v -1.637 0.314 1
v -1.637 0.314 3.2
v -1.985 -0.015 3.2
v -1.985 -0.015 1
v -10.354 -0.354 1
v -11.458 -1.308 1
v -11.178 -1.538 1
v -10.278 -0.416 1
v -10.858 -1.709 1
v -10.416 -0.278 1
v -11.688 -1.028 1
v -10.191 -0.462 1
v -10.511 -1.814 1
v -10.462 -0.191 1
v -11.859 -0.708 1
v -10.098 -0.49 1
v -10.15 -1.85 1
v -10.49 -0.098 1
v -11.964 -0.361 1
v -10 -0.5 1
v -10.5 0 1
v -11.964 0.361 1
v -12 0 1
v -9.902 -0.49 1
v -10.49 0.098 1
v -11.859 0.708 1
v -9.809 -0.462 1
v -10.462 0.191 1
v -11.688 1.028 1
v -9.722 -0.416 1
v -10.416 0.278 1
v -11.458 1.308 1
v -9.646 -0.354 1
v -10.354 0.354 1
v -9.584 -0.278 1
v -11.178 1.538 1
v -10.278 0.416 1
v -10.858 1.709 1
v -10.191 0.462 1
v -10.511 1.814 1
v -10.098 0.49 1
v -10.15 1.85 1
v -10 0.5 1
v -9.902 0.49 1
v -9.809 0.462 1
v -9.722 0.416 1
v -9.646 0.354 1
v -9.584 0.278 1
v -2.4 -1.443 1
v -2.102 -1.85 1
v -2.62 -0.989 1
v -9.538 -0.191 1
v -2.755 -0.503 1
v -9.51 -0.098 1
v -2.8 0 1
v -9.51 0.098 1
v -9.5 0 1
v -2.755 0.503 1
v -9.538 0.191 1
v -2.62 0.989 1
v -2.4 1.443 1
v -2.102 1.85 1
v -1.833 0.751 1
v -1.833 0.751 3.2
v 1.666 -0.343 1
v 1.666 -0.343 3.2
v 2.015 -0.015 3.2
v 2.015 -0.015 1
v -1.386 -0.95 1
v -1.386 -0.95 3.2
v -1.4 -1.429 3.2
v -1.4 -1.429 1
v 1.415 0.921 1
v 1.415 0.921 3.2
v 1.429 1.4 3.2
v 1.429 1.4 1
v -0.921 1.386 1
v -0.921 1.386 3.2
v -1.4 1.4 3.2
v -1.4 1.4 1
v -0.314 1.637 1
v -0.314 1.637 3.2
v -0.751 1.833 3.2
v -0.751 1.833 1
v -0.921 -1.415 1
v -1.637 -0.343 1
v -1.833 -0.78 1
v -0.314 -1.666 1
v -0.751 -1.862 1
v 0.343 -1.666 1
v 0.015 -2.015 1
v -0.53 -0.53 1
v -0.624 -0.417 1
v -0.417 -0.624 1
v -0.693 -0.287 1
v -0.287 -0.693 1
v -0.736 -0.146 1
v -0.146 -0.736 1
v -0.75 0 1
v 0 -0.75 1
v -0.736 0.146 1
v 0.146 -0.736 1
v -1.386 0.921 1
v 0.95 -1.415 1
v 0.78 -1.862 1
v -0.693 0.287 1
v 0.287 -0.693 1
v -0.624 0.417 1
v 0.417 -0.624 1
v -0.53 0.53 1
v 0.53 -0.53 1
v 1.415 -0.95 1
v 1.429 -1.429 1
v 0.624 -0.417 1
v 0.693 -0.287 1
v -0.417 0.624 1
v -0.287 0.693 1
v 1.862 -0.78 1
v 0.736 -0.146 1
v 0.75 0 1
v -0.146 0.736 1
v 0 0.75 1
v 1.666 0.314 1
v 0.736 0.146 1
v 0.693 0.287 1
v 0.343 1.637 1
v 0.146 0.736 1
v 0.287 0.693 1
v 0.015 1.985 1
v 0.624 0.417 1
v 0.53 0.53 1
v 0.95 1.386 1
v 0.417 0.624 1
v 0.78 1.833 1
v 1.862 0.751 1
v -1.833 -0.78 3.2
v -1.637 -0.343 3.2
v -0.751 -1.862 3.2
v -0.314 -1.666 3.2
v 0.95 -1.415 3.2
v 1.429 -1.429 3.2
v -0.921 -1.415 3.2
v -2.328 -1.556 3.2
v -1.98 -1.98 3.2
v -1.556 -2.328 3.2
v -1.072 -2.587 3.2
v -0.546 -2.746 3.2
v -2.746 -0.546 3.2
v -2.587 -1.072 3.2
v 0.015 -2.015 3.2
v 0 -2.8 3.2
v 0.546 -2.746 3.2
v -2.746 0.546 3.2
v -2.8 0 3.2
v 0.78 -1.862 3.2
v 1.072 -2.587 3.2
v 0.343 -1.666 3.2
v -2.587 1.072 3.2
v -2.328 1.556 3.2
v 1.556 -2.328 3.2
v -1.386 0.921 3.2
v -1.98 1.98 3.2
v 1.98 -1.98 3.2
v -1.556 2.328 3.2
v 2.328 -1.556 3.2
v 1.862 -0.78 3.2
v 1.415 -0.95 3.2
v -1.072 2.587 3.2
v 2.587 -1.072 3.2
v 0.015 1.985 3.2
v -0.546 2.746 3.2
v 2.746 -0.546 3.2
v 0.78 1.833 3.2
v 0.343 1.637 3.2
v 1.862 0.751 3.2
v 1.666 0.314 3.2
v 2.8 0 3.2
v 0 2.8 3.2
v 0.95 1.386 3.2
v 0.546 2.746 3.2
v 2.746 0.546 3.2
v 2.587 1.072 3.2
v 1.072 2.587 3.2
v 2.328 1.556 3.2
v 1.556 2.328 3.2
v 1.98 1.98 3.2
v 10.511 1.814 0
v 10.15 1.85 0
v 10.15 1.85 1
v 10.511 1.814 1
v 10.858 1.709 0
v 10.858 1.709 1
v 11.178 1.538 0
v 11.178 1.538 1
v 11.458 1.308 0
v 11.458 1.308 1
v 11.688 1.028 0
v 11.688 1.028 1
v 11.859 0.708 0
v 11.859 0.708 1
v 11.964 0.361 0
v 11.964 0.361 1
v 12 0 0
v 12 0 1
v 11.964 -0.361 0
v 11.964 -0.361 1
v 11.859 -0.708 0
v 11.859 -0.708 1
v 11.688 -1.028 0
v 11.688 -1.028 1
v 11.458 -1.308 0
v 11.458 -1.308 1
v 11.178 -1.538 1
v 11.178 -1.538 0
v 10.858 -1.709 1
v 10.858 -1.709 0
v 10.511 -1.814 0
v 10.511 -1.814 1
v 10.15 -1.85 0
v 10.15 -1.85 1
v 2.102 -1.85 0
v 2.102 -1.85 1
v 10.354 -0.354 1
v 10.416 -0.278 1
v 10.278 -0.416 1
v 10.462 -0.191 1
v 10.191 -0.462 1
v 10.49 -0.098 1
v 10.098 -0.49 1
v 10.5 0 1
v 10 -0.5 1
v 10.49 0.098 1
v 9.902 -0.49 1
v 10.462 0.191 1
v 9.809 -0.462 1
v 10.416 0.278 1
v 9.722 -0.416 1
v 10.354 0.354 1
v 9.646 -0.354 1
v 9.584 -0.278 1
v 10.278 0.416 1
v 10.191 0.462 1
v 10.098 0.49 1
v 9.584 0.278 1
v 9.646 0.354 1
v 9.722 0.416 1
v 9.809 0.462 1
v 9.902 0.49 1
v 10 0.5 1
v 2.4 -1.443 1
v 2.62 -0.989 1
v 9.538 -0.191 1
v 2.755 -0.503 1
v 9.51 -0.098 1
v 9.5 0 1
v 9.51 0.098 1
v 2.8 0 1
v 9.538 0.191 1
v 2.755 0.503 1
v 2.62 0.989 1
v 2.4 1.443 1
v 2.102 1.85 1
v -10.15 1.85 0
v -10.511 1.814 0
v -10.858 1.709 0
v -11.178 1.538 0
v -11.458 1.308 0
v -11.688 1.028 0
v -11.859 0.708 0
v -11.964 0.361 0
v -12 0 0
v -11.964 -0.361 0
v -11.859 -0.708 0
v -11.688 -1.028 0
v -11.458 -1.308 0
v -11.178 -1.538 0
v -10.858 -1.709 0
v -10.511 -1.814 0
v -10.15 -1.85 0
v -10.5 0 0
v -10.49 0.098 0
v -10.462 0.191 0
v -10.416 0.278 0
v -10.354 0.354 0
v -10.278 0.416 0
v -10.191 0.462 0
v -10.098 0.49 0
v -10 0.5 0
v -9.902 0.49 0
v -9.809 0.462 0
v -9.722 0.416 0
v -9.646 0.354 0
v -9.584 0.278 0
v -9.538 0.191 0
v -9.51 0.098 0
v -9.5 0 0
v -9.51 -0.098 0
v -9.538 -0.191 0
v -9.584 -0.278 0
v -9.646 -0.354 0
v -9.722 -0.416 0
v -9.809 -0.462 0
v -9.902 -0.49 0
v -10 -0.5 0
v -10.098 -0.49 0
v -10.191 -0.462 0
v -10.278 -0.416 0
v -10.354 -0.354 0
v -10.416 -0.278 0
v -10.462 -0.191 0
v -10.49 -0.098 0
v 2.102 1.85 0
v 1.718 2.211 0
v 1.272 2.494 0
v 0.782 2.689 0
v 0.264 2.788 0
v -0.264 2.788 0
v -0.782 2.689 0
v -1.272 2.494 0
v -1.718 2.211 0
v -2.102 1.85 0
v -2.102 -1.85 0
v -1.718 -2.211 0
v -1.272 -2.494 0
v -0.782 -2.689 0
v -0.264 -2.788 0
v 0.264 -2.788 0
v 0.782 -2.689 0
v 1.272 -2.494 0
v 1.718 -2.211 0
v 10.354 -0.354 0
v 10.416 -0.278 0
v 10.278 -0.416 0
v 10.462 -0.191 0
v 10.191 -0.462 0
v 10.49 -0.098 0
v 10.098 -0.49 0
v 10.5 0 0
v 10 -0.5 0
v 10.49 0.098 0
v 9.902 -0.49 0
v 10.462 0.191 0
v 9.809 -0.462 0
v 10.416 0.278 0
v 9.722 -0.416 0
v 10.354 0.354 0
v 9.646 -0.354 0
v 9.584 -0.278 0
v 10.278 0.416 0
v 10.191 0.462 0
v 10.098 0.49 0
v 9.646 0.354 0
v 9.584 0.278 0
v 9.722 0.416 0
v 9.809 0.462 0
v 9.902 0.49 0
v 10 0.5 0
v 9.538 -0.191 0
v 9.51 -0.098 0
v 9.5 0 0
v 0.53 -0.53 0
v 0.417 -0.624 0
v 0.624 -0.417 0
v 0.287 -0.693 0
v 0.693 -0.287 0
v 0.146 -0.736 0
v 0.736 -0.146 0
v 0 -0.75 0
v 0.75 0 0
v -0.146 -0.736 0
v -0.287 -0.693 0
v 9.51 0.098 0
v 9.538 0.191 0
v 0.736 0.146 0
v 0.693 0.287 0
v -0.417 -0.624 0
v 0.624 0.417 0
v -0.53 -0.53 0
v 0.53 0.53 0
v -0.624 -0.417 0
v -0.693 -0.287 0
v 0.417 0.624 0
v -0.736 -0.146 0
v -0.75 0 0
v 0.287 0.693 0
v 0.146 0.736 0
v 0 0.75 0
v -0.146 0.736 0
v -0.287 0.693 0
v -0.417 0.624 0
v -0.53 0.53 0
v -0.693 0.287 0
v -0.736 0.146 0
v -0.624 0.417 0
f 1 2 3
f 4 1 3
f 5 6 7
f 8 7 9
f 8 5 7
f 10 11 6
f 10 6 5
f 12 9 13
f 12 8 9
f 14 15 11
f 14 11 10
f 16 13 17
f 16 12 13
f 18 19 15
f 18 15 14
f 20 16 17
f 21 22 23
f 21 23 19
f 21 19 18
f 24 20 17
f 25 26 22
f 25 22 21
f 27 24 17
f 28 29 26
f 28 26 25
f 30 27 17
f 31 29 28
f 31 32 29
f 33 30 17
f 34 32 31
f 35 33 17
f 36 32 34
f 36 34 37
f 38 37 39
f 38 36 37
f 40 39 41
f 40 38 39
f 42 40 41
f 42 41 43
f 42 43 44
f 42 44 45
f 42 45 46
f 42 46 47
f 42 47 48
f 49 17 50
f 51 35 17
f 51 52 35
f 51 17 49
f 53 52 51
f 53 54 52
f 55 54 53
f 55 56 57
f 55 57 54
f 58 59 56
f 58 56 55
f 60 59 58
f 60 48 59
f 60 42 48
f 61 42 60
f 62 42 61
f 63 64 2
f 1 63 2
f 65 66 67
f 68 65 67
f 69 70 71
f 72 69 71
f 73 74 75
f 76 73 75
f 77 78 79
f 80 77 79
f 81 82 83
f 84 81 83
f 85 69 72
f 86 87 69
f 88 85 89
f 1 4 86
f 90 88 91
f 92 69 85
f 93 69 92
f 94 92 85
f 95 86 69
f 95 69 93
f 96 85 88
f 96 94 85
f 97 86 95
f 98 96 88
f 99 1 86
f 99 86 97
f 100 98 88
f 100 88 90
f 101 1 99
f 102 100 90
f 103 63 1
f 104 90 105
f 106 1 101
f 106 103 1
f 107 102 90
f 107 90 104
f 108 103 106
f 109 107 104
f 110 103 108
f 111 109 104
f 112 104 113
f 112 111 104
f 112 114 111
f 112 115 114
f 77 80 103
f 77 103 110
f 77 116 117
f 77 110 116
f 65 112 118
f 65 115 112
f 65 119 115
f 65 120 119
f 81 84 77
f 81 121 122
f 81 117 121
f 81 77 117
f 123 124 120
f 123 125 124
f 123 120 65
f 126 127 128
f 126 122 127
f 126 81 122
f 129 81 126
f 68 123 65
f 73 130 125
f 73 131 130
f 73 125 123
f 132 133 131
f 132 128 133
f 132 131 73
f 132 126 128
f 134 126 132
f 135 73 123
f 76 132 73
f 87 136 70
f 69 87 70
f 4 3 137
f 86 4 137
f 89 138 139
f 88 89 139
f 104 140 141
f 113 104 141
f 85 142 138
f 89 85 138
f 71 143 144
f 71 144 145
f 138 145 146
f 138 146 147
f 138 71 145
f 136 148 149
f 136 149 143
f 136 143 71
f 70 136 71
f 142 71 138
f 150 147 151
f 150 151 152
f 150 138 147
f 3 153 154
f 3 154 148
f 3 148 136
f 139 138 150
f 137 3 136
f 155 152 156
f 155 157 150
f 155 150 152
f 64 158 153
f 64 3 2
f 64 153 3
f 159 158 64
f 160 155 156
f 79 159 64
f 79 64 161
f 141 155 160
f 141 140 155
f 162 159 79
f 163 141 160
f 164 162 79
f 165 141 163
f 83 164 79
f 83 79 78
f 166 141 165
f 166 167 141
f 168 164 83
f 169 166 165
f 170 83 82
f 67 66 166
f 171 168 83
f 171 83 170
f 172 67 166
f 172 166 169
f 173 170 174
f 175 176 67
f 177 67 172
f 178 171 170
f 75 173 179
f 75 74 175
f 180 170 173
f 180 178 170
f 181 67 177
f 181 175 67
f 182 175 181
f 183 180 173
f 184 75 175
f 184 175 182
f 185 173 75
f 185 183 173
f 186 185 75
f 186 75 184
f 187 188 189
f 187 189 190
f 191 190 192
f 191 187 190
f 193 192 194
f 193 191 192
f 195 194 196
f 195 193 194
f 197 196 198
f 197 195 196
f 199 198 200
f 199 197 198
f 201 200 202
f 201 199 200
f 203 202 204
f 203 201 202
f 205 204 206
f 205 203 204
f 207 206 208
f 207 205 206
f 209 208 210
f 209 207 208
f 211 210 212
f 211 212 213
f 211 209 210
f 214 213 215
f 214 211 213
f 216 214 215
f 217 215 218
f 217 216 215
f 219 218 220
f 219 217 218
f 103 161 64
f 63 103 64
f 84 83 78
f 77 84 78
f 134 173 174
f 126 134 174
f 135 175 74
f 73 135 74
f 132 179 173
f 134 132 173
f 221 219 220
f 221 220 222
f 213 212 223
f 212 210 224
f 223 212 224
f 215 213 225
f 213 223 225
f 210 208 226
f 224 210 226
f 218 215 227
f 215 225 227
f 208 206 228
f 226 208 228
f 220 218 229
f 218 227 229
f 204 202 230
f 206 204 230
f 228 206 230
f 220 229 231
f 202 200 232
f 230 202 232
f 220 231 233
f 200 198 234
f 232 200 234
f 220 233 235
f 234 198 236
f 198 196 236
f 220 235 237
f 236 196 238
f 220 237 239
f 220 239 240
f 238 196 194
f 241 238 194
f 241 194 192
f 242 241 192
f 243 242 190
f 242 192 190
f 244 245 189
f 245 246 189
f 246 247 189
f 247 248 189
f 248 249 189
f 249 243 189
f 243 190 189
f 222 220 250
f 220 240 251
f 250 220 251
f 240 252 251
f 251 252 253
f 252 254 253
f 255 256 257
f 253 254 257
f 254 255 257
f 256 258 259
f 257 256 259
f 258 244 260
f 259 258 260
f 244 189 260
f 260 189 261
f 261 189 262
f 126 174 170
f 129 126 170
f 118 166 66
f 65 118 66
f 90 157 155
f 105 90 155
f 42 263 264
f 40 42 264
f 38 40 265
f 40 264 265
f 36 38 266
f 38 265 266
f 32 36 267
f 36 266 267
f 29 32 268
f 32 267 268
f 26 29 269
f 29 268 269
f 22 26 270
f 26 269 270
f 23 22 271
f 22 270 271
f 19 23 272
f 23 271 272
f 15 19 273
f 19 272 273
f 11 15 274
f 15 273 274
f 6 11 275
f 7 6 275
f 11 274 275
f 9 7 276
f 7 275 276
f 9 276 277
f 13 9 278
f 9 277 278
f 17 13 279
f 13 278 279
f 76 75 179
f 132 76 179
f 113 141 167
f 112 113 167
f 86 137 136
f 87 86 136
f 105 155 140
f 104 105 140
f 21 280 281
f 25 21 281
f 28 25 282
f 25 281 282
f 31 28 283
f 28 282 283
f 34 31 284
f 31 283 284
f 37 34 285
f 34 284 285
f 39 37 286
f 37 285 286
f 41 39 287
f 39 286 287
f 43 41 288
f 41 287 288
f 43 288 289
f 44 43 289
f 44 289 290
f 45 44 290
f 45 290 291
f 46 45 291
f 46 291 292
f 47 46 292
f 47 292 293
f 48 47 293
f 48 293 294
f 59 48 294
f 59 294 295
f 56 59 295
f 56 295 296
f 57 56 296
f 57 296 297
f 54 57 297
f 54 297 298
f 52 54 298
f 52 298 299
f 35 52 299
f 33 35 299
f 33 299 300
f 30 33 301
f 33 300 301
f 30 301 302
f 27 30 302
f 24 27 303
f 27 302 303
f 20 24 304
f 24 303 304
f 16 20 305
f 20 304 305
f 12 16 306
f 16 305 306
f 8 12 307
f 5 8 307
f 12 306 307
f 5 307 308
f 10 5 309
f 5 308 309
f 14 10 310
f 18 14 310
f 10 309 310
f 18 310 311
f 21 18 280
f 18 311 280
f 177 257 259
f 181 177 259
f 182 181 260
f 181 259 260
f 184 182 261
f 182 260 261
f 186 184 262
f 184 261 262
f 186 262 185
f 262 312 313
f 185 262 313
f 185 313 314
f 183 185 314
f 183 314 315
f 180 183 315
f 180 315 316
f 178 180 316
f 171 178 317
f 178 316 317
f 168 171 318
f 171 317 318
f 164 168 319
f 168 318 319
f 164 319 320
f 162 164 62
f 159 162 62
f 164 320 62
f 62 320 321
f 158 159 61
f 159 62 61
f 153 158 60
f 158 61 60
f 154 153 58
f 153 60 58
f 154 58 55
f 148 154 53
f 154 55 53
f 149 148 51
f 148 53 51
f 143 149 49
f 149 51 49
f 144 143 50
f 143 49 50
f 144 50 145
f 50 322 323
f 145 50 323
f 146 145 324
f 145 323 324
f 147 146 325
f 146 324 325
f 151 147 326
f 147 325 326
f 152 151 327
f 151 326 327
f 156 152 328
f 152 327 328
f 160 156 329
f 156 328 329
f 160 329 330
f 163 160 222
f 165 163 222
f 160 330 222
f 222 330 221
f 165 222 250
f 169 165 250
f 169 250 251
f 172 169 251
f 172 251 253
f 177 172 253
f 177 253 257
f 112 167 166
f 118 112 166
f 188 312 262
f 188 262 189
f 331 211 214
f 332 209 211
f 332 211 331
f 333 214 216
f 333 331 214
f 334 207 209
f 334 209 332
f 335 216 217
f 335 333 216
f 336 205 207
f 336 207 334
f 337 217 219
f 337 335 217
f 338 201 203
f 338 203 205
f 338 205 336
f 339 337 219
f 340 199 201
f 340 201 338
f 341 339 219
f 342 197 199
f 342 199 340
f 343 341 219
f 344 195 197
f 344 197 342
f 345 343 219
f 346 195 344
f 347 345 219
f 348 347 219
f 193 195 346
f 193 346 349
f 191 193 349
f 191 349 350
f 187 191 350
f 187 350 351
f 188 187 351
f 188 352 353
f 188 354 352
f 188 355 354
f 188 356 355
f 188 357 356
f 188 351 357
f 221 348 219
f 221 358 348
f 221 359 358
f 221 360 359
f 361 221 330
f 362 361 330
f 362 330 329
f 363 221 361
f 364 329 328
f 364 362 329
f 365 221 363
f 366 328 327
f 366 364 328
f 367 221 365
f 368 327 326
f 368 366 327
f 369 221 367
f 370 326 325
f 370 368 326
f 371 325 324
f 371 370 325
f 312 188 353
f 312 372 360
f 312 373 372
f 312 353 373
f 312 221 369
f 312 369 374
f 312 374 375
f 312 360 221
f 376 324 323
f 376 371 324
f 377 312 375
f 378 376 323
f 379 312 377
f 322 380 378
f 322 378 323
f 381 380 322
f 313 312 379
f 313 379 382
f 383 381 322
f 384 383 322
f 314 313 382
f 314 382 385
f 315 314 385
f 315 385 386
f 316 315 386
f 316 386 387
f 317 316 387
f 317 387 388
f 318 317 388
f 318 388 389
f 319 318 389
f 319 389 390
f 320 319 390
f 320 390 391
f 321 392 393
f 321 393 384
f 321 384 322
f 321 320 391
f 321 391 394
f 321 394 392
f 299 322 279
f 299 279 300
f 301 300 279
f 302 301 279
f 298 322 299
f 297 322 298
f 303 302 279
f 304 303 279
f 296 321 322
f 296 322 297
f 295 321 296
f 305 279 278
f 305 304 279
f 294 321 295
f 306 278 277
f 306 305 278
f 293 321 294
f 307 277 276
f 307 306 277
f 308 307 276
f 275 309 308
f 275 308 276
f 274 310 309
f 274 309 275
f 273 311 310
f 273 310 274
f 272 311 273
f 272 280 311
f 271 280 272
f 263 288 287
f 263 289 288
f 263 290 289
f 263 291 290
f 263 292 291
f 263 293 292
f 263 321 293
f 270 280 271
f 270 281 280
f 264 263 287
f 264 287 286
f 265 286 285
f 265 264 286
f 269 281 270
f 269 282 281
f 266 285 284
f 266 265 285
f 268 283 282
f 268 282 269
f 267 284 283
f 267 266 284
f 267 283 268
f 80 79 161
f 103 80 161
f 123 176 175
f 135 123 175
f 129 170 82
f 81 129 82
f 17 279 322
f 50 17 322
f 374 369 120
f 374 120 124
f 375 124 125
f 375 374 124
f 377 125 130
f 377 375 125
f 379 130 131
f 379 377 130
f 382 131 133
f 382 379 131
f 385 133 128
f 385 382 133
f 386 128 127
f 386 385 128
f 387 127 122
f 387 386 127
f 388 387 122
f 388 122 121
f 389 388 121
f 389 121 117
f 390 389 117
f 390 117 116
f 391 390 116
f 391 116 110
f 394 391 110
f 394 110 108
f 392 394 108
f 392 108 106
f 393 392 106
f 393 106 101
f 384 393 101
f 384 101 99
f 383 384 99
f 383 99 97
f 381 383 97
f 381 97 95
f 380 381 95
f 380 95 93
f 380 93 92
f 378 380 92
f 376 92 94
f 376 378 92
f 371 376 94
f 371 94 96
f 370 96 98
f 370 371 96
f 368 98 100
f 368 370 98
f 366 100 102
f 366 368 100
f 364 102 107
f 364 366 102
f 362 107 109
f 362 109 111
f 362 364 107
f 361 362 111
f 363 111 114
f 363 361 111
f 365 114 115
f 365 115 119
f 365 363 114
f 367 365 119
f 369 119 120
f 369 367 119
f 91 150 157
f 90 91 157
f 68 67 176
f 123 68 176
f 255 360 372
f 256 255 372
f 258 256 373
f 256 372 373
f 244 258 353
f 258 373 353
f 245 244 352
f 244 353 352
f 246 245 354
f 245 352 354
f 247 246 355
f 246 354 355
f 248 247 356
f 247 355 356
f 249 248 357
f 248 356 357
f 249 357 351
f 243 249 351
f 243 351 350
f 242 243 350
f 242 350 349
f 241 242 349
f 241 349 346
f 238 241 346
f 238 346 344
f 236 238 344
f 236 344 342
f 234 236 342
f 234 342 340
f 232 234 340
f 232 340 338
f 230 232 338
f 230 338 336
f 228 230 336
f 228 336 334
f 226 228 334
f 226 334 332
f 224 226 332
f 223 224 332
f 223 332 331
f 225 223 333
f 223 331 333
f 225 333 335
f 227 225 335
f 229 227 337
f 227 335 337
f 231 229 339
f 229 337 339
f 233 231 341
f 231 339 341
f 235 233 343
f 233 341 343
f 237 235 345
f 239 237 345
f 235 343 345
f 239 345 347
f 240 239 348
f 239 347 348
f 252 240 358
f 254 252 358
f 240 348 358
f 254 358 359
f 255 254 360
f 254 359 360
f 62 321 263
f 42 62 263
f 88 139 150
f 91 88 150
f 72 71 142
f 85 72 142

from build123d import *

# Parameters (mm, degrees)
SKETCH1_R           = 2.8
BOSS_EXTRUDE1_DEPTH = 3.2
CUT_EXTRUDE1_DEPTH  = 2.2
SKETCH3_R           = 0.75
CUT_EXTRUDE2_DEPTH  = 1
BOSS_EXTRUDE2_DEPTH = 1
CUT_EXTRUDE3_REACH  = 5.2
SKETCH5_R           = 0.5


with BuildPart() as part:
    # Sketch1 → Boss-Extrude1 (new body)
    with BuildSketch(Plane.XY):
        Circle(SKETCH1_R)
    extrude(amount=BOSS_EXTRUDE1_DEPTH)

    # Sketch2 → Cut-Extrude1 (cut)
    with BuildSketch(Plane.XY.offset(3.2)):
        Polygon((0.014651949, 1.985348051), (-0.313876209, 1.636970634), (-0.750714916, 1.833107116), (-0.920917091, 1.385526068), (-1.399561614, 1.399561614), (-1.385526068, 0.920917091), (-1.833107116, 0.750714916), (-1.636970634, 0.313876209), (-1.985348051, -0.014651949), (-1.636970634, -0.343180107), (-1.833107116, -0.780018813), (-1.385526068, -0.950220989), (-1.399561614, -1.428865511), (-0.920917091, -1.414829965), (-0.750714916, -1.862411014), (-0.313876209, -1.666274532), (0.014651949, -2.014651949), (0.343180107, -1.666274532), (0.780018813, -1.862411014), (0.950220989, -1.414829965), (1.428865511, -1.428865511), (1.414829965, -0.950220989), (1.862411014, -0.780018813), (1.666274532, -0.343180107), (2.014651949, -0.014651949), (1.666274532, 0.313876209), (1.862411014, 0.750714916), (1.414829965, 0.920917091), (1.428865511, 1.399561614), (0.950220989, 1.385526068), (0.780018813, 1.833107116), (0.343180107, 1.636970634), align=None)
    extrude(amount=-CUT_EXTRUDE1_DEPTH, mode=Mode.SUBTRACT)

    # Sketch3 → Cut-Extrude2 (cut)
    with BuildSketch(Plane.XY):
        Circle(SKETCH3_R)
    extrude(amount=CUT_EXTRUDE2_DEPTH, mode=Mode.SUBTRACT)

    # Sketch4 → Boss-Extrude2 (add)
    with BuildSketch(Plane.XY):
        with BuildLine():
            ThreePointArc((10.15, 1.85), (12, 0), (10.15, -1.85))
            Line((10.15, -1.85), (0.75, -1.85))
            Line((0.75, -1.85), (0.75, 1.85))
            Line((0.75, 1.85), (10.15, 1.85))
        make_face()
        with BuildLine():
            Line((-0.75, 1.85), (-10.15, 1.85))
            ThreePointArc((-10.15, 1.85), (-12, 0), (-10.15, -1.85))
            Line((-10.15, -1.85), (-0.75, -1.85))
            Line((-0.75, -1.85), (-0.75, 1.85))
        make_face()
    extrude(amount=BOSS_EXTRUDE2_DEPTH)

    # Sketch5 → Cut-Extrude3 (cut, up to next)
    with BuildSketch(Plane(origin=(0, 0, 0), x_dir=(-1, 0, 0), z_dir=(0, 0, -1)), mode=Mode.PRIVATE) as cut_extrude3_sk1:
        with Locations((10, 0)):
            Circle(SKETCH5_R)
    cut_extrude3_tool1 = extrude(cut_extrude3_sk1.sketch, amount=-CUT_EXTRUDE3_REACH, mode=Mode.PRIVATE) & part.part
    add(cut_extrude3_tool1.solids().sort_by_distance((-10, 0, 0))[0], mode=Mode.SUBTRACT)
    # Sketch5 → Cut-Extrude3 (cut, up to next)
    with BuildSketch(Plane(origin=(0, 0, 0), x_dir=(-1, 0, 0), z_dir=(0, 0, -1)), mode=Mode.PRIVATE) as cut_extrude3_sk2:
        with Locations((-10, 0)):
            Circle(SKETCH5_R)
    cut_extrude3_tool2 = extrude(cut_extrude3_sk2.sketch, amount=-CUT_EXTRUDE3_REACH, mode=Mode.PRIVATE) & part.part
    add(cut_extrude3_tool2.solids().sort_by_distance((10, 0, 0))[0], mode=Mode.SUBTRACT)


solid = part.part
